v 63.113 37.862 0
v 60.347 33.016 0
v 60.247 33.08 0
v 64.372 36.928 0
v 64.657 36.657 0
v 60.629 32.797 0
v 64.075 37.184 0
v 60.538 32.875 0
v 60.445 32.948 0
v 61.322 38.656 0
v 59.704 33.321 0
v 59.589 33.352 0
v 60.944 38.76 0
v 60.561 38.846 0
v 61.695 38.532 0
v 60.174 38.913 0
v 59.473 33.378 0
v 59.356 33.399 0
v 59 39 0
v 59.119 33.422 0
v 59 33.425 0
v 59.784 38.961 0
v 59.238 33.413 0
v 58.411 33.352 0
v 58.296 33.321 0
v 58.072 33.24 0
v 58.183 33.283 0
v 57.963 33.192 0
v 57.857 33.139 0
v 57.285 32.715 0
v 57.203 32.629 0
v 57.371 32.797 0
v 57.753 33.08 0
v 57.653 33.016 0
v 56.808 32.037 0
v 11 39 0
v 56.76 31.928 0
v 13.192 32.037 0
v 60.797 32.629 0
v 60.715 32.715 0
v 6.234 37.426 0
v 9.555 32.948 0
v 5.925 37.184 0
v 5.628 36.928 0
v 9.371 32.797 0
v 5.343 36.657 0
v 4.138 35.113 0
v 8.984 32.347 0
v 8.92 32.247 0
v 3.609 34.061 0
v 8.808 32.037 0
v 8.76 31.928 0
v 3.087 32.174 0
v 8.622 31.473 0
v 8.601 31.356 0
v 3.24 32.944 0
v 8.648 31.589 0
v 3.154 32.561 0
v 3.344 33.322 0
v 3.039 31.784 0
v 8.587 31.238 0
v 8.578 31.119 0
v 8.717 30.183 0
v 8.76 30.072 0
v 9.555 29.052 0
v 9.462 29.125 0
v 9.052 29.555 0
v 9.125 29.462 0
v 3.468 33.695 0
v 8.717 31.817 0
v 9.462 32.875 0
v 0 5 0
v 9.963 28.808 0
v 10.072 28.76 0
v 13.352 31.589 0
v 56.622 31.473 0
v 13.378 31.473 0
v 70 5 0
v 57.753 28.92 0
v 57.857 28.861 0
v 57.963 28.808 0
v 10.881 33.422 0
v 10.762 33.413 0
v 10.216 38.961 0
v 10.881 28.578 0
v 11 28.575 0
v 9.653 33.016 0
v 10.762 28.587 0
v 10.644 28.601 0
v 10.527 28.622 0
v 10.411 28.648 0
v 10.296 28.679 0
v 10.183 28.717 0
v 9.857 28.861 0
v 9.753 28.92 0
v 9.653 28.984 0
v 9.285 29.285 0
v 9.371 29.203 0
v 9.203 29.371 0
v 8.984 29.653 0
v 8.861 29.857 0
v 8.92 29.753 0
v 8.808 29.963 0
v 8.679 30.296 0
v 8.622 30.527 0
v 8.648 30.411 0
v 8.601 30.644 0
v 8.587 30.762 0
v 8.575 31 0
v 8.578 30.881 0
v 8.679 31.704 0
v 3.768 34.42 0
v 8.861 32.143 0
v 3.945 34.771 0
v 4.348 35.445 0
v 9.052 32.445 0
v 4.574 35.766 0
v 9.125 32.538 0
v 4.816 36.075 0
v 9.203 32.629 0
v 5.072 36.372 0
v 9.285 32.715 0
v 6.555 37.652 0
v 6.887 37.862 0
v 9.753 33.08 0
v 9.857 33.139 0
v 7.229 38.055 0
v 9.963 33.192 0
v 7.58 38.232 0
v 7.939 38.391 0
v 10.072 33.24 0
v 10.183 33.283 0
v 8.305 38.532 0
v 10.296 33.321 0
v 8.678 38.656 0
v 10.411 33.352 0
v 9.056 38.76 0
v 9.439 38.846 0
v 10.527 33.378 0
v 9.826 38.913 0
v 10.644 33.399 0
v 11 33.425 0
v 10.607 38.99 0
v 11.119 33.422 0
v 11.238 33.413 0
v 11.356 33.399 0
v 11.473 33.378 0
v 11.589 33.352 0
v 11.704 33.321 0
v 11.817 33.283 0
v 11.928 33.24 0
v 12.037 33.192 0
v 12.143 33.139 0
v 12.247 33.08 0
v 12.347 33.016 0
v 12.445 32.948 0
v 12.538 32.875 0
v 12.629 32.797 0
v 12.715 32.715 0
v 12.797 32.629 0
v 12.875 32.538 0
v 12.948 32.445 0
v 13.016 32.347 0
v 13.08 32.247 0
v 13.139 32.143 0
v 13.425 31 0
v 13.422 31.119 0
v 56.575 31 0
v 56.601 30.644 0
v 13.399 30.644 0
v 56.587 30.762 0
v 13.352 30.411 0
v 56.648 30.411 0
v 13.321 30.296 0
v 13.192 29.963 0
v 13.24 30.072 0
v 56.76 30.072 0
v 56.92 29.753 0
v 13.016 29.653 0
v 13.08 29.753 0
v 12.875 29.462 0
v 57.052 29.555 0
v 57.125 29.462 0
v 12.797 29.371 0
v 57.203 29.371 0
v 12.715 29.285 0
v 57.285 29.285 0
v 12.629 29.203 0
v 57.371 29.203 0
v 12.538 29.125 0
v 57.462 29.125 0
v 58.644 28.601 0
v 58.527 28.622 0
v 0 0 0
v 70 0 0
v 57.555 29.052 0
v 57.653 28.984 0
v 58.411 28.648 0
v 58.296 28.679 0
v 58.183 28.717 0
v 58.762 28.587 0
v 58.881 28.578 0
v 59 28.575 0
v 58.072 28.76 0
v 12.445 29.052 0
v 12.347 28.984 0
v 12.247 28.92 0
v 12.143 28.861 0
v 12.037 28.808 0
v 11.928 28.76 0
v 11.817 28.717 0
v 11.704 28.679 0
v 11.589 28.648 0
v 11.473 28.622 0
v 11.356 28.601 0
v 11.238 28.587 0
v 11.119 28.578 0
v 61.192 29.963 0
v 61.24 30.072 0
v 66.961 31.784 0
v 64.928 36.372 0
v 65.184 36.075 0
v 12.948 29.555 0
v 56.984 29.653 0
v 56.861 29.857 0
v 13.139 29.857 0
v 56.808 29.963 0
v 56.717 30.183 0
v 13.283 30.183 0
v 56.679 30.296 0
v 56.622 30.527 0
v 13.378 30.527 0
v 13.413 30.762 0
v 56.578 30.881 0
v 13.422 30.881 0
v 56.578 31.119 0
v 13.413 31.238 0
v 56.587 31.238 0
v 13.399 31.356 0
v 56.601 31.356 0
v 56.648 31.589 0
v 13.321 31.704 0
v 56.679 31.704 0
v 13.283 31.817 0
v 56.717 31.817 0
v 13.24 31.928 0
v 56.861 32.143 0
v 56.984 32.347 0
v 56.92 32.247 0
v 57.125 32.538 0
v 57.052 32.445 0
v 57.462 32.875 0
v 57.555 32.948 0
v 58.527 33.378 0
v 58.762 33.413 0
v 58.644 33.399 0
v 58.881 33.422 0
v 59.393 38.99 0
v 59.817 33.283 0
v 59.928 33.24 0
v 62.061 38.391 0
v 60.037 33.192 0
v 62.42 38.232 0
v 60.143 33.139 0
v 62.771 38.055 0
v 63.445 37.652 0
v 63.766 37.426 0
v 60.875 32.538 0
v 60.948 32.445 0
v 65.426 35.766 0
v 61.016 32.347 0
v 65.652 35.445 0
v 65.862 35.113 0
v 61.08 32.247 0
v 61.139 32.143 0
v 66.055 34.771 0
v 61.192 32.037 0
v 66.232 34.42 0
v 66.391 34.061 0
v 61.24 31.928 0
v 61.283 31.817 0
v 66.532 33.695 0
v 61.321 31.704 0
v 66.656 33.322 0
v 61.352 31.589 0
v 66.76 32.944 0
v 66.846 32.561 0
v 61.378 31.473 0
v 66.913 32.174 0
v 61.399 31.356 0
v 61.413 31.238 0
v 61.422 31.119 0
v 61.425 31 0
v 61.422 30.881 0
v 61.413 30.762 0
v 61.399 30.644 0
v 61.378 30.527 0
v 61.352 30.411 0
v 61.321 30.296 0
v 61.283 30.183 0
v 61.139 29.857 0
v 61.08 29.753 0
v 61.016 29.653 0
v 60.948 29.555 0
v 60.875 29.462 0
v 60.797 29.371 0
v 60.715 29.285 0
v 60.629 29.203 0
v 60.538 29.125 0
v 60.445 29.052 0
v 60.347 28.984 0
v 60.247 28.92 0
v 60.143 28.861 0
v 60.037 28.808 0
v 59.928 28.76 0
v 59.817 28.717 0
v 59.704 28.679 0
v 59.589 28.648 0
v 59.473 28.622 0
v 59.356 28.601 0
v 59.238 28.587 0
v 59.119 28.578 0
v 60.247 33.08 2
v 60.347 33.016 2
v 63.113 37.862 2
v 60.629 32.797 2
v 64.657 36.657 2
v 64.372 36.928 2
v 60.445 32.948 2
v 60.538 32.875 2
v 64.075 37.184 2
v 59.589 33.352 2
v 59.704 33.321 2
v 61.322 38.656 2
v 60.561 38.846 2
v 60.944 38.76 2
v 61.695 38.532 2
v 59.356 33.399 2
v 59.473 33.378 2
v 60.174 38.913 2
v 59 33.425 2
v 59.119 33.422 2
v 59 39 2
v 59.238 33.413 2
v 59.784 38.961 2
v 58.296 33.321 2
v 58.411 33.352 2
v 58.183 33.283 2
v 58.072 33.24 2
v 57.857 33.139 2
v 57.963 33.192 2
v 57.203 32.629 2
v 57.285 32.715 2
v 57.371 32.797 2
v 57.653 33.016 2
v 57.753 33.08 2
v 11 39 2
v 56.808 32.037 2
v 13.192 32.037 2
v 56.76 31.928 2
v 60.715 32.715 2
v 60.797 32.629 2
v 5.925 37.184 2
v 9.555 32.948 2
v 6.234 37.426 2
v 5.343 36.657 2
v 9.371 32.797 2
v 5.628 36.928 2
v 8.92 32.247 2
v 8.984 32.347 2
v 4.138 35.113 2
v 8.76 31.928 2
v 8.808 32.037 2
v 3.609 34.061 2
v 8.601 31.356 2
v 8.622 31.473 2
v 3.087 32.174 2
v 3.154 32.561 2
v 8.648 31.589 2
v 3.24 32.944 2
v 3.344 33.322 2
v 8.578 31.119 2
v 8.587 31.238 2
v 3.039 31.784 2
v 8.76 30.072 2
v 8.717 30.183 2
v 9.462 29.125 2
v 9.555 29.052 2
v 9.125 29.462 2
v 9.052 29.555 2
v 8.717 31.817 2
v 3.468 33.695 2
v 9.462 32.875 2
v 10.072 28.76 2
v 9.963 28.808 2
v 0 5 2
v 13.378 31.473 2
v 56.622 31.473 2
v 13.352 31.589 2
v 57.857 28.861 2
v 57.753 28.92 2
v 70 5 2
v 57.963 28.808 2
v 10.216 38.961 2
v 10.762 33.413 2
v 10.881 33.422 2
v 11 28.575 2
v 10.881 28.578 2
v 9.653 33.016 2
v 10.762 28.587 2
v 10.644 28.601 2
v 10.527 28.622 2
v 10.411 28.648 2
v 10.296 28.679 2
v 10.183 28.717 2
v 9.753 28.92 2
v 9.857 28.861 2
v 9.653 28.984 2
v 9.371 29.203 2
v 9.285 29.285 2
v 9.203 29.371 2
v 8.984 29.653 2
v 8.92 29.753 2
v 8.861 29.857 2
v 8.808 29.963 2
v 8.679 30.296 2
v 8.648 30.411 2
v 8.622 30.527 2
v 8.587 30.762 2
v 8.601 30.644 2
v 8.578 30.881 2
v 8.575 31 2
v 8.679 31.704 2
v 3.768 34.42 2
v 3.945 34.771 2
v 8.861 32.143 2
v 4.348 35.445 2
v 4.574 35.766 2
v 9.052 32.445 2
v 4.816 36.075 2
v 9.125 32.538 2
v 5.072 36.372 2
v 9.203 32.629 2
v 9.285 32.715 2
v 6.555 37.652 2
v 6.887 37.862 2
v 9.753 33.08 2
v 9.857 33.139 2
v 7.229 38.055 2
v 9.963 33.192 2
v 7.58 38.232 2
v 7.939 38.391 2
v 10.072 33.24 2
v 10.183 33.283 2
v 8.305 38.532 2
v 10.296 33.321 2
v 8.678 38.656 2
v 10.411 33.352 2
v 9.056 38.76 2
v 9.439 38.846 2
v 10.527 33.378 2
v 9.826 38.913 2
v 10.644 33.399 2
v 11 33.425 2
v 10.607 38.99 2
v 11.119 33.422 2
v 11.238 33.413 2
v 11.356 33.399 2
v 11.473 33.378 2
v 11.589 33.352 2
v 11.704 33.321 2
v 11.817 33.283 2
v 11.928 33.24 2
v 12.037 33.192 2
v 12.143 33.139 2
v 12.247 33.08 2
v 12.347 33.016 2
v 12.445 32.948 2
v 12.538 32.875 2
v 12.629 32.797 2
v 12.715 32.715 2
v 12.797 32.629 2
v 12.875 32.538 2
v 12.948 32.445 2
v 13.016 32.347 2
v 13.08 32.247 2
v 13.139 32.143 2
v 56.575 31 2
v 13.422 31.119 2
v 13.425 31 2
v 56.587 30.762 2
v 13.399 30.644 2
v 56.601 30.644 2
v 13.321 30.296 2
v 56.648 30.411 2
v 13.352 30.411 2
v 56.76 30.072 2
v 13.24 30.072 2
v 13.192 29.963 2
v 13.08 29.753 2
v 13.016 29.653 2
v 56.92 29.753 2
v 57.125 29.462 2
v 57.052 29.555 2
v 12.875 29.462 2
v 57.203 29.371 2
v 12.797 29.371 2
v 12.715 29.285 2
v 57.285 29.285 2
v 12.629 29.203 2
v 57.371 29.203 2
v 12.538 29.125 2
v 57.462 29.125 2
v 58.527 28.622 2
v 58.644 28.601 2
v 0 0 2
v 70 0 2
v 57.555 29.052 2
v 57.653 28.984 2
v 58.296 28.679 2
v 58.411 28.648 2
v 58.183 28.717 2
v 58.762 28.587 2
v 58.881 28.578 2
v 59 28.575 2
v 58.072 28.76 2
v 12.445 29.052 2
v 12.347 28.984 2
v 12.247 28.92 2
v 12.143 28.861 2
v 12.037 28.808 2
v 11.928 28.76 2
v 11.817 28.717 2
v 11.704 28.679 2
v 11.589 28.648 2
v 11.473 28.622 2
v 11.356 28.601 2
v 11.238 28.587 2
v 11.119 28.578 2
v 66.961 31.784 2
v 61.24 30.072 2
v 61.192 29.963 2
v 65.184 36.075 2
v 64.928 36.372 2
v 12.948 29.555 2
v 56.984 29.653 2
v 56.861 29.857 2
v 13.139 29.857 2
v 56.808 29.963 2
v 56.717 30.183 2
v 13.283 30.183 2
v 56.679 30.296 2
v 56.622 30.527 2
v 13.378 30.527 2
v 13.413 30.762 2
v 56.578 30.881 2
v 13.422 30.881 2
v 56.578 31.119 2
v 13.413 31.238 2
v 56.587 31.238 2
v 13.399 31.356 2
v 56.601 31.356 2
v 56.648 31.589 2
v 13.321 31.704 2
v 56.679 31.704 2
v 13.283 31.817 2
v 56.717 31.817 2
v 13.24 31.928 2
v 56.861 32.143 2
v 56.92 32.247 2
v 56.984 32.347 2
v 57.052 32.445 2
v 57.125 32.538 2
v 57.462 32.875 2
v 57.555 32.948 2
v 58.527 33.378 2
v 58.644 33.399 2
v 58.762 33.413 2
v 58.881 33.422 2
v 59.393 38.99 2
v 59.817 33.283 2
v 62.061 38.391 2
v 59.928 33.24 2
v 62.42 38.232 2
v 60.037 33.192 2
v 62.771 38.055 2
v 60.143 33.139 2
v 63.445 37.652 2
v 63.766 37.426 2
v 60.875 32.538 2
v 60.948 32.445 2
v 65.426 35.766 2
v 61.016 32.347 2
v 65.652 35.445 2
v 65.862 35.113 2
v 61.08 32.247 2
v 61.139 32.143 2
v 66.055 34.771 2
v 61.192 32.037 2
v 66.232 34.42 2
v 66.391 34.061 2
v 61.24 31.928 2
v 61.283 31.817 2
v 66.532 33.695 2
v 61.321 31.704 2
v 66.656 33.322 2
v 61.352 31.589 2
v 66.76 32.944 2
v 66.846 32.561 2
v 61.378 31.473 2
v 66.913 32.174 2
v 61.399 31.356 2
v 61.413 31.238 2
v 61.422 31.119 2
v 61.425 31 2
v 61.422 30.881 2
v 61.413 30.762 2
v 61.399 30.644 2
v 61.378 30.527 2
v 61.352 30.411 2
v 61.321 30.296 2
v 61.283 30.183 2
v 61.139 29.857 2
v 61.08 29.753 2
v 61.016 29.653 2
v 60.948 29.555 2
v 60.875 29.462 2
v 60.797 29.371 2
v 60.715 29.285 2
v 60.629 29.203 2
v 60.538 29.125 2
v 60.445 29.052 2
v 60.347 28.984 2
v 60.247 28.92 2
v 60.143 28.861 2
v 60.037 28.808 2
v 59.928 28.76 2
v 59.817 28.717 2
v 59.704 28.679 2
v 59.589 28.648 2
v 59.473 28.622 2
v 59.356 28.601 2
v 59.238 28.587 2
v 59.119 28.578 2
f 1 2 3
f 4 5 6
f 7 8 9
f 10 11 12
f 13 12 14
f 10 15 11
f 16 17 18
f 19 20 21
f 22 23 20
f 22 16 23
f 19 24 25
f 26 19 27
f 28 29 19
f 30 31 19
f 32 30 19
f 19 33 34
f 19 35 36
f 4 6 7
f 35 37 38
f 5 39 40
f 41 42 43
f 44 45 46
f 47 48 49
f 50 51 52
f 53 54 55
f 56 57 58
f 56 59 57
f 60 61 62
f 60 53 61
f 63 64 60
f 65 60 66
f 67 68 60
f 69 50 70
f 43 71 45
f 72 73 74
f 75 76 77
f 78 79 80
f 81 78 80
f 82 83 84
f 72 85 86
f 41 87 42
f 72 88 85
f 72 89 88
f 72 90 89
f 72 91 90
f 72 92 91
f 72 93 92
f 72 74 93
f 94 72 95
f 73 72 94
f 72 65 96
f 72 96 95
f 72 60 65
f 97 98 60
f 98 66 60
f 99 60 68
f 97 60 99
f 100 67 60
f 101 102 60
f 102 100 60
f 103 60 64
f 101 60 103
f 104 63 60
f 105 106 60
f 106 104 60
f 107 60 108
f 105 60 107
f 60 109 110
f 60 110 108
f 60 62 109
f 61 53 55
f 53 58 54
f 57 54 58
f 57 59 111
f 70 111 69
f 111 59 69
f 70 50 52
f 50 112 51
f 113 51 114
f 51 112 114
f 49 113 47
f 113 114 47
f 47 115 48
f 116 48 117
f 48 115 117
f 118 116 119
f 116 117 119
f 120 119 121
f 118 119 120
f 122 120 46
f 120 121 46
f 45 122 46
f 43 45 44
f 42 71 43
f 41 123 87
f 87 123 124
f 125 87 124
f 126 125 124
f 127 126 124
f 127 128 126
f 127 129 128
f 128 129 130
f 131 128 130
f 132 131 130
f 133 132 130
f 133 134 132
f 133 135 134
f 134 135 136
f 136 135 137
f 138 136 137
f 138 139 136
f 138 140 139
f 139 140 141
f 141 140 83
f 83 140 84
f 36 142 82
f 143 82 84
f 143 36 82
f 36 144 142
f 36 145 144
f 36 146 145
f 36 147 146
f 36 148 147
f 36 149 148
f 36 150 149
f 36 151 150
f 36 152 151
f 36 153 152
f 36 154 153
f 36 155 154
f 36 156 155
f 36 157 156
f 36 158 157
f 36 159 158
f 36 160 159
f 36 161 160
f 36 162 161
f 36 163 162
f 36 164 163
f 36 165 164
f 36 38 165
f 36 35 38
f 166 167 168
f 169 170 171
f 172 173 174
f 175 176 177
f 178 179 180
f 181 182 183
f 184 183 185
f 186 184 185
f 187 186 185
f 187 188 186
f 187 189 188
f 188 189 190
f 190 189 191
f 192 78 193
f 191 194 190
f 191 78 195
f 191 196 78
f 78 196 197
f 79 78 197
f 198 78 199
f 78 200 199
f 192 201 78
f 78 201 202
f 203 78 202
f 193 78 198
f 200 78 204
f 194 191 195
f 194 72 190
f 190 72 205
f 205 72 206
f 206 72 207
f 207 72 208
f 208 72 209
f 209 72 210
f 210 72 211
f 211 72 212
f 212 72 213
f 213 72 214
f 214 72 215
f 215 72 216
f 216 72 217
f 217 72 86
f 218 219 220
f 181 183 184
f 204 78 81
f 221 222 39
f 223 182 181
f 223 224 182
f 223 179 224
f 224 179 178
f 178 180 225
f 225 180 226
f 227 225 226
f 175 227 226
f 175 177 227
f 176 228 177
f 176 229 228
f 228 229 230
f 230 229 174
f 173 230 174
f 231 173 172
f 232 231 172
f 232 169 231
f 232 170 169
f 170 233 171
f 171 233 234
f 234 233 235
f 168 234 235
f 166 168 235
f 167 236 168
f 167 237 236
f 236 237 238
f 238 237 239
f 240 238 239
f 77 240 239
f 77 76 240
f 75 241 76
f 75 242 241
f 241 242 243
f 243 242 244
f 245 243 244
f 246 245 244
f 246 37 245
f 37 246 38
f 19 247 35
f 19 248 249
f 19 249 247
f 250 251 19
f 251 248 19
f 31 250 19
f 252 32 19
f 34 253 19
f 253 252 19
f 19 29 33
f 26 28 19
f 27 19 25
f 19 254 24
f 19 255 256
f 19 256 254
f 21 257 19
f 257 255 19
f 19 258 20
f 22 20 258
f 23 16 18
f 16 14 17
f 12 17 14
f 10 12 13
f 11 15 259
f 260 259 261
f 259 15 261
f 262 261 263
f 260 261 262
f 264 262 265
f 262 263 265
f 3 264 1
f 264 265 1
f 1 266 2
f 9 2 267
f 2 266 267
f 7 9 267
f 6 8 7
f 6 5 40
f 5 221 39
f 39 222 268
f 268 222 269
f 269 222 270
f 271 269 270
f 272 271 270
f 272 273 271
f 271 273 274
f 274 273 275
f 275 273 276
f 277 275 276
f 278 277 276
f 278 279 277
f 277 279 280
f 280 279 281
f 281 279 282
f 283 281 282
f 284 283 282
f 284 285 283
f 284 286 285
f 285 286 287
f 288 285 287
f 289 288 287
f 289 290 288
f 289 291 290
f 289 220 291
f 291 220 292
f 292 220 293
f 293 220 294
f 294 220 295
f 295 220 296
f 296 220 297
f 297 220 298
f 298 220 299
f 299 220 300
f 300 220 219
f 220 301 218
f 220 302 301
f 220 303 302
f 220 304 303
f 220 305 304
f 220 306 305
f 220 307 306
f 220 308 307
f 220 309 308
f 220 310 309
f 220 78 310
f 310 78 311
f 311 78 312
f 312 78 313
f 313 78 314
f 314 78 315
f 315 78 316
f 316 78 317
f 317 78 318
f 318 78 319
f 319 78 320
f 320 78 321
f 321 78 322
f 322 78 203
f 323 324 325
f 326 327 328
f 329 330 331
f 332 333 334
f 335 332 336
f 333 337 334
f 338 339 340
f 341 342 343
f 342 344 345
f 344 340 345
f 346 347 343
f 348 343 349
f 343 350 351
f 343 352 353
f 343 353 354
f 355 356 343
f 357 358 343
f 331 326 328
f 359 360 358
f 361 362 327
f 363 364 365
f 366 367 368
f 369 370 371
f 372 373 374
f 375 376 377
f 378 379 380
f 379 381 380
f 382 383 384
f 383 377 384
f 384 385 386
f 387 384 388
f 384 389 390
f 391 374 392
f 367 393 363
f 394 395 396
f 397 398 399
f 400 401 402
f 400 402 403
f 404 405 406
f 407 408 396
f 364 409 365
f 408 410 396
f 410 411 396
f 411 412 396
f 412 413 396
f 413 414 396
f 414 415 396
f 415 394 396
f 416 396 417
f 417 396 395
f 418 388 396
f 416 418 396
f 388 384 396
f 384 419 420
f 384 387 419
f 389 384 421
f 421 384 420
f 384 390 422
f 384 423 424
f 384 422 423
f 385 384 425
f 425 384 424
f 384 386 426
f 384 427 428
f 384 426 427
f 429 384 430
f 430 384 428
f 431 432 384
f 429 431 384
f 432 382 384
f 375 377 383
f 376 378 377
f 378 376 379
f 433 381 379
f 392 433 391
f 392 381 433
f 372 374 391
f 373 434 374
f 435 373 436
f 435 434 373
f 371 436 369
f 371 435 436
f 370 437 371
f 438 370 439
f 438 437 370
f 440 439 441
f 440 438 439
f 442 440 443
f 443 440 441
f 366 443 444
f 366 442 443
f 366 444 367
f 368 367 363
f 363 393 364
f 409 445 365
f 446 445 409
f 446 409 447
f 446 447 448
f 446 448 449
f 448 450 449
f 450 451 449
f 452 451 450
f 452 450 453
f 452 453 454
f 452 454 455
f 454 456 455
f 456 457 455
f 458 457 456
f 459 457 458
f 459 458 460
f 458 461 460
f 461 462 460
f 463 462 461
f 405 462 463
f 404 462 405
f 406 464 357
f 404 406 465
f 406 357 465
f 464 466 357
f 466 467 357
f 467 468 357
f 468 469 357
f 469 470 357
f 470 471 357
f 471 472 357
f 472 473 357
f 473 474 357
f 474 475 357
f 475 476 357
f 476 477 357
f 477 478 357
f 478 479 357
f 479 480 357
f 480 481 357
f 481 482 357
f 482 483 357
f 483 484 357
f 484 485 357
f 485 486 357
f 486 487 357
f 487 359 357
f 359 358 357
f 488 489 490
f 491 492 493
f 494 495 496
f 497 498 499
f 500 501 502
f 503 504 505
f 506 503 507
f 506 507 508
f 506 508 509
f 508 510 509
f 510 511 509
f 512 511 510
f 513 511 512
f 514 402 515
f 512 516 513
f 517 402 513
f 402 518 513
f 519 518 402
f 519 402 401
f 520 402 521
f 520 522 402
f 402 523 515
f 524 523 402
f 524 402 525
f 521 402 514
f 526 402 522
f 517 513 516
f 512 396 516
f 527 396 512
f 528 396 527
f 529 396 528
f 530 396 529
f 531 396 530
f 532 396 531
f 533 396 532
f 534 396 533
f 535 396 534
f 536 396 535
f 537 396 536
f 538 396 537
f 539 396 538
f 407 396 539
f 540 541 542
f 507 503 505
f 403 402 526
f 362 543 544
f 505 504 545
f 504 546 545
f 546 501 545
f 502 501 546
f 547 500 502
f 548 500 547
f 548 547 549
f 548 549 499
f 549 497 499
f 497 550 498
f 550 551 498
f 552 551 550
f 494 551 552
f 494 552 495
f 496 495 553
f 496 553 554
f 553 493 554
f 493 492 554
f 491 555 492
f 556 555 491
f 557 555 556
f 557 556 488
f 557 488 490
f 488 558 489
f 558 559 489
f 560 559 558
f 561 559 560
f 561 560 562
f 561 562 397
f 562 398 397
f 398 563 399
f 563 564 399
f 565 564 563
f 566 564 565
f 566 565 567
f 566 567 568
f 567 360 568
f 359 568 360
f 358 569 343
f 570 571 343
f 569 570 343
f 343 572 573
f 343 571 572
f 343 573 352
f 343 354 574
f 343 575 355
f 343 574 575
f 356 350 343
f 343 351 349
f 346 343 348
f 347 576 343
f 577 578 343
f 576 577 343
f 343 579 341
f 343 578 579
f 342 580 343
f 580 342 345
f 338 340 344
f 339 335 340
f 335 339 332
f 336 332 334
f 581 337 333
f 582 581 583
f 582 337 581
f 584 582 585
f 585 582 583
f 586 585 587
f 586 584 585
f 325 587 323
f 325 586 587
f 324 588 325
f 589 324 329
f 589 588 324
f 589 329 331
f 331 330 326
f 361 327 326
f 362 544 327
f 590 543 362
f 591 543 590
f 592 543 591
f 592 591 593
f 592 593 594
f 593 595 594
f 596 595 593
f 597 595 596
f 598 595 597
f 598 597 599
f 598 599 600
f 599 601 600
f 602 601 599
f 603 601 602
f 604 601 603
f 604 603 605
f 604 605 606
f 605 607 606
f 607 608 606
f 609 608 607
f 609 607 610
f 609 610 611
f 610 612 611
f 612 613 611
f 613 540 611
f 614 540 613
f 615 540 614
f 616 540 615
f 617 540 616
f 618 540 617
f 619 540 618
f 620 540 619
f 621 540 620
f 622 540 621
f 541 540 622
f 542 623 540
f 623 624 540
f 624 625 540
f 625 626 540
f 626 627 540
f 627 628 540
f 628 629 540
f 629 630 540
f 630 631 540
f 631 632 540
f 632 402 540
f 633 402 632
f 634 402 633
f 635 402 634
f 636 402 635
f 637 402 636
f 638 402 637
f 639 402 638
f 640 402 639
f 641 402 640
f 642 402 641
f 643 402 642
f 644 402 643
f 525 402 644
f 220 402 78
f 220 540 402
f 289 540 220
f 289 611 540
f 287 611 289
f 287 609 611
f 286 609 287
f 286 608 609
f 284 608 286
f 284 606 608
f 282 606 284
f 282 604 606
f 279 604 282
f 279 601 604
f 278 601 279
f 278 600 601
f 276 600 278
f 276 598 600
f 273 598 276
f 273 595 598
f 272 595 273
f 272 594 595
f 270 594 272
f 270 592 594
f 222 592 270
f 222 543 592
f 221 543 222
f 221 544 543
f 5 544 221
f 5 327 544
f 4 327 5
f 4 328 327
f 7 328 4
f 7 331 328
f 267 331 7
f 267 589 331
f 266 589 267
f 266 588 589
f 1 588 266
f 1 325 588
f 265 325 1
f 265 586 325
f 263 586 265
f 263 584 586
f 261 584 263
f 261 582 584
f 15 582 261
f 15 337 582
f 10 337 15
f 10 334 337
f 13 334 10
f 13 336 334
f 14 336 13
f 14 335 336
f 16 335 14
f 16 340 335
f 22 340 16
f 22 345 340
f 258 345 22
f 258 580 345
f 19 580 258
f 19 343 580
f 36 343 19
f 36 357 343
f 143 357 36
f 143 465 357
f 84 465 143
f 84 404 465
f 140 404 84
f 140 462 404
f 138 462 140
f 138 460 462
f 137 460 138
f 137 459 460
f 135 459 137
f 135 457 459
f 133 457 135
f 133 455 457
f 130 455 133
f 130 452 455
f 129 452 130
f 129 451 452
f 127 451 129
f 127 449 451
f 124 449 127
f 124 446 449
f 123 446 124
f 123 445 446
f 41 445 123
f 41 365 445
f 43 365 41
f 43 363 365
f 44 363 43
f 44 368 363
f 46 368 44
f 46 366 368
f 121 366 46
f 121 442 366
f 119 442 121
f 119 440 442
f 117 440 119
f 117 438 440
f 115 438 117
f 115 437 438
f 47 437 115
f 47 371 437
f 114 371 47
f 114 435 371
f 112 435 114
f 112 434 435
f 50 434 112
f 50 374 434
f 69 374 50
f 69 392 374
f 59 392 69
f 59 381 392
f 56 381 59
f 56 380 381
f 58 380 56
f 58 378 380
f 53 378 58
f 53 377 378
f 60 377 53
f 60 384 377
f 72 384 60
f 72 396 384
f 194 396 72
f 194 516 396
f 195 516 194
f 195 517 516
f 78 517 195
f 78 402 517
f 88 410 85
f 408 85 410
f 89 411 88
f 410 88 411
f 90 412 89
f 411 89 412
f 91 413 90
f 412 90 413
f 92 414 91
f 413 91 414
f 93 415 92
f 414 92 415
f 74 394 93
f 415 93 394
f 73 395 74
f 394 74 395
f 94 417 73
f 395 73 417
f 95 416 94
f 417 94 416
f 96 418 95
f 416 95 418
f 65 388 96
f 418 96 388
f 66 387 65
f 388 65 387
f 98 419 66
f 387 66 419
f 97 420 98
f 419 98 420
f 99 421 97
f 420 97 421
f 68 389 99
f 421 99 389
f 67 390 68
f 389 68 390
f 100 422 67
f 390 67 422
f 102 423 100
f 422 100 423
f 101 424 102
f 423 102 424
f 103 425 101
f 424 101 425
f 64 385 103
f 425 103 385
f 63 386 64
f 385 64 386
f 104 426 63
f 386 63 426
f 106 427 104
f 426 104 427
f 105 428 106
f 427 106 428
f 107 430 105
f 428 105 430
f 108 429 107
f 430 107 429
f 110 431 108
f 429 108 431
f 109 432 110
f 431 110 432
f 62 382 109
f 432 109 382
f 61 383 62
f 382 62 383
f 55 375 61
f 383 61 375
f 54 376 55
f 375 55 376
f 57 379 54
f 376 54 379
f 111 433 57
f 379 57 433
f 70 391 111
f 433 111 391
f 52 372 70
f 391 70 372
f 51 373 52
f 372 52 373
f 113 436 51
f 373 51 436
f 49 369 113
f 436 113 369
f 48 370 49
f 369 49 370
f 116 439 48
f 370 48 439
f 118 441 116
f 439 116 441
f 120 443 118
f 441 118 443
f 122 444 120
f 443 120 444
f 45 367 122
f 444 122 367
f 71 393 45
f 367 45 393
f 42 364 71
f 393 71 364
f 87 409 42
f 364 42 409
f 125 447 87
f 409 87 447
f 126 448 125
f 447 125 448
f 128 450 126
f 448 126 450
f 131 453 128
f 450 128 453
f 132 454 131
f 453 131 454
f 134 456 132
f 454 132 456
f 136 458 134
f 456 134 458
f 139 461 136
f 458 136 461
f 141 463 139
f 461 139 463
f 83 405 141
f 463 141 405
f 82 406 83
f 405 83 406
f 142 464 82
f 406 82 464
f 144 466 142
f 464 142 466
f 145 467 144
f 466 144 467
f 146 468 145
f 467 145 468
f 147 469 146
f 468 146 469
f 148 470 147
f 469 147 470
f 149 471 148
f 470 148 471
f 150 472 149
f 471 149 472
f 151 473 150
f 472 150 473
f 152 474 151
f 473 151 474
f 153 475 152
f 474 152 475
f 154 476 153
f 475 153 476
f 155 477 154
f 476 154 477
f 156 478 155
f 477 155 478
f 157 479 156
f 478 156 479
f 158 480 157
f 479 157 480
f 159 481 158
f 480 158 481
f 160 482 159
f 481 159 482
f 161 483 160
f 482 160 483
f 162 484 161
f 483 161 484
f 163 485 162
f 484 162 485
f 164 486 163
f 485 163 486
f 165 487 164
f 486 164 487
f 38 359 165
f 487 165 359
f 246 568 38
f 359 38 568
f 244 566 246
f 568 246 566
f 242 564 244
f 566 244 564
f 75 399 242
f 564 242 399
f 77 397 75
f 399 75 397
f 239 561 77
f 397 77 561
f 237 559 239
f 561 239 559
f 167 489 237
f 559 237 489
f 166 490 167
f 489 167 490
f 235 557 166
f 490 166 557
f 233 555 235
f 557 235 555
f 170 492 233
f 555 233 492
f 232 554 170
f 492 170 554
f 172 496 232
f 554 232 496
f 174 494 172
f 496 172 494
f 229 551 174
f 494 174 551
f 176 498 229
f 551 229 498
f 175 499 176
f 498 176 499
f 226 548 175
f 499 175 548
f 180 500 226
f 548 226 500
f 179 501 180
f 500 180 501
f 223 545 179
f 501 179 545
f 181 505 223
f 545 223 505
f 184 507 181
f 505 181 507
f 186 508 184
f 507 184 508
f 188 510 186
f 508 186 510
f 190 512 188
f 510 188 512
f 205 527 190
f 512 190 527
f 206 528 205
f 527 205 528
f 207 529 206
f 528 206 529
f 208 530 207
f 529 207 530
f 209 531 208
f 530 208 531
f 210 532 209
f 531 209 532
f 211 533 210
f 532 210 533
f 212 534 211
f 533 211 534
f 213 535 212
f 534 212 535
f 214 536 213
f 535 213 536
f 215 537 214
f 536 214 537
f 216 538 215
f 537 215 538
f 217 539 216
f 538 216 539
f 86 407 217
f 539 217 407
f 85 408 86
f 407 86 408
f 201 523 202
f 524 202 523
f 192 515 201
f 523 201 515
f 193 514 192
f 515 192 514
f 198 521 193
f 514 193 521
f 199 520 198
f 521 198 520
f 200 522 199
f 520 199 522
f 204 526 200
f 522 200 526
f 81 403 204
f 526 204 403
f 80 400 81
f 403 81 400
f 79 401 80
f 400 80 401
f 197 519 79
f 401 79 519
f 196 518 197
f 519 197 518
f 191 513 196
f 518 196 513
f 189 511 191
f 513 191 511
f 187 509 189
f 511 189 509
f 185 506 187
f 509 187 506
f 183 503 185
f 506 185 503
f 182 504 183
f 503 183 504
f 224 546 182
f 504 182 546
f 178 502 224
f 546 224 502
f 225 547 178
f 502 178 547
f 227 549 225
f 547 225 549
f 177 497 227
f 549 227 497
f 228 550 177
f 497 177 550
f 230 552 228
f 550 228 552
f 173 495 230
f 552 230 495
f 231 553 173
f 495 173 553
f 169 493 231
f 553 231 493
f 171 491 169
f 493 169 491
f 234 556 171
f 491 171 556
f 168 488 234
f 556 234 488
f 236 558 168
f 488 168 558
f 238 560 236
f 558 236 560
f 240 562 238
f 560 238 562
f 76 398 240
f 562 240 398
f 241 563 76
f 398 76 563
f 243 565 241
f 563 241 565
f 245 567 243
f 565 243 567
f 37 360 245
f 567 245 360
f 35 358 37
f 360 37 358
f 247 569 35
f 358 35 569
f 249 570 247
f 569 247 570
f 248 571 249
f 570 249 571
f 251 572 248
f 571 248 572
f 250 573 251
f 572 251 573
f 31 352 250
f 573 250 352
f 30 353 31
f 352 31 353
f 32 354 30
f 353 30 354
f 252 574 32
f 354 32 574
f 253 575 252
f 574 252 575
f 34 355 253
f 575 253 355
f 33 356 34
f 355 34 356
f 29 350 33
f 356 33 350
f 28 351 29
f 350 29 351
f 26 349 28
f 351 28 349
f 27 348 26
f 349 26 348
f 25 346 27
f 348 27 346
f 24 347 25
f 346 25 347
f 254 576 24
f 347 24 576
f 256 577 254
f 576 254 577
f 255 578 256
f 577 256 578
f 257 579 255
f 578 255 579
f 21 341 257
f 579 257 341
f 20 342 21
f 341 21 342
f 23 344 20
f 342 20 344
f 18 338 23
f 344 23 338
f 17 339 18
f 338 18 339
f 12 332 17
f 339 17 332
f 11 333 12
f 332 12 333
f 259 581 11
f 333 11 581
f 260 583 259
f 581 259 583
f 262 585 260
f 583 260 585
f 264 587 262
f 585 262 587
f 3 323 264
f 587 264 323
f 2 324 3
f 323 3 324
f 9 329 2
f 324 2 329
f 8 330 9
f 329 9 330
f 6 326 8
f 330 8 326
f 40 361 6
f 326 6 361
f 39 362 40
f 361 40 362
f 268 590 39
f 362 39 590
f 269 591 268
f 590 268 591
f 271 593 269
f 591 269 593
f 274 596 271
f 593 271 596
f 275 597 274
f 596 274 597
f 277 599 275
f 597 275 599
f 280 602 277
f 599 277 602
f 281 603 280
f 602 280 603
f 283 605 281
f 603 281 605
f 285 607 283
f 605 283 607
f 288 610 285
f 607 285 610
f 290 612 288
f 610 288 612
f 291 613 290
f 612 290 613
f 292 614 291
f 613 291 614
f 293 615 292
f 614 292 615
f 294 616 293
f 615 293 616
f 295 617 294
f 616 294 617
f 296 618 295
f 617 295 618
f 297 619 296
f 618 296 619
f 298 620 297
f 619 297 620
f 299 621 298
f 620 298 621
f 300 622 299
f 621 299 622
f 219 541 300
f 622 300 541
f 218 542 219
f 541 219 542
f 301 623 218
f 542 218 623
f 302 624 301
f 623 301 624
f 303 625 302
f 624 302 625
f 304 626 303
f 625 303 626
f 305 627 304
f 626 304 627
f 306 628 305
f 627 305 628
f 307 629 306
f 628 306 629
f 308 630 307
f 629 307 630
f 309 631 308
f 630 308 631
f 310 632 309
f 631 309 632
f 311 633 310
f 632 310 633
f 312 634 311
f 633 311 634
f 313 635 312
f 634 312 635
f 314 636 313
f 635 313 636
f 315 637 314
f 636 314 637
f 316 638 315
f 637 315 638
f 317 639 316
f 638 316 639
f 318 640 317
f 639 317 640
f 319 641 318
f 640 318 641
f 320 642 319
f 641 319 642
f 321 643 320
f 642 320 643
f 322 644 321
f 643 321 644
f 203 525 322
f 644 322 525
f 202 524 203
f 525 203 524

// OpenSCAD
/*
 * vim:ts=4:sw=4:sts=4:et:ai:si:fdm=marker
 *
 * Dings til å henge bakå ei symaskin og så sette fra seg sytrådsneller på.
 *
 * Se README.md for detaljer og LICENSE.txt for lisens.
 */

$fn = 128;

tol = .25; // Tolerance

x = 70;
y1 = 5;
y2 = 26;
x1 = 11;
r1 = 8;
r2 = (4.6+tol)/2;
echo(str("tol = ", tol, " and r2 = ", r2, ", so d2 is ", r2*2));

linear_extrude(2) {
    difference() {
        hull() {
            square([x,y1]);
            translate([x1,y1+y2]) {
                circle(r=r1);
            }
            translate([x-x1,y1+y2]) {
                circle(r=r1);
            }
        }
        translate([x1,y1+y2]) {
            circle(r=r2);
        }
        translate([x-x1,y1+y2]) {
            circle(r=r2);
        }
    }
}
